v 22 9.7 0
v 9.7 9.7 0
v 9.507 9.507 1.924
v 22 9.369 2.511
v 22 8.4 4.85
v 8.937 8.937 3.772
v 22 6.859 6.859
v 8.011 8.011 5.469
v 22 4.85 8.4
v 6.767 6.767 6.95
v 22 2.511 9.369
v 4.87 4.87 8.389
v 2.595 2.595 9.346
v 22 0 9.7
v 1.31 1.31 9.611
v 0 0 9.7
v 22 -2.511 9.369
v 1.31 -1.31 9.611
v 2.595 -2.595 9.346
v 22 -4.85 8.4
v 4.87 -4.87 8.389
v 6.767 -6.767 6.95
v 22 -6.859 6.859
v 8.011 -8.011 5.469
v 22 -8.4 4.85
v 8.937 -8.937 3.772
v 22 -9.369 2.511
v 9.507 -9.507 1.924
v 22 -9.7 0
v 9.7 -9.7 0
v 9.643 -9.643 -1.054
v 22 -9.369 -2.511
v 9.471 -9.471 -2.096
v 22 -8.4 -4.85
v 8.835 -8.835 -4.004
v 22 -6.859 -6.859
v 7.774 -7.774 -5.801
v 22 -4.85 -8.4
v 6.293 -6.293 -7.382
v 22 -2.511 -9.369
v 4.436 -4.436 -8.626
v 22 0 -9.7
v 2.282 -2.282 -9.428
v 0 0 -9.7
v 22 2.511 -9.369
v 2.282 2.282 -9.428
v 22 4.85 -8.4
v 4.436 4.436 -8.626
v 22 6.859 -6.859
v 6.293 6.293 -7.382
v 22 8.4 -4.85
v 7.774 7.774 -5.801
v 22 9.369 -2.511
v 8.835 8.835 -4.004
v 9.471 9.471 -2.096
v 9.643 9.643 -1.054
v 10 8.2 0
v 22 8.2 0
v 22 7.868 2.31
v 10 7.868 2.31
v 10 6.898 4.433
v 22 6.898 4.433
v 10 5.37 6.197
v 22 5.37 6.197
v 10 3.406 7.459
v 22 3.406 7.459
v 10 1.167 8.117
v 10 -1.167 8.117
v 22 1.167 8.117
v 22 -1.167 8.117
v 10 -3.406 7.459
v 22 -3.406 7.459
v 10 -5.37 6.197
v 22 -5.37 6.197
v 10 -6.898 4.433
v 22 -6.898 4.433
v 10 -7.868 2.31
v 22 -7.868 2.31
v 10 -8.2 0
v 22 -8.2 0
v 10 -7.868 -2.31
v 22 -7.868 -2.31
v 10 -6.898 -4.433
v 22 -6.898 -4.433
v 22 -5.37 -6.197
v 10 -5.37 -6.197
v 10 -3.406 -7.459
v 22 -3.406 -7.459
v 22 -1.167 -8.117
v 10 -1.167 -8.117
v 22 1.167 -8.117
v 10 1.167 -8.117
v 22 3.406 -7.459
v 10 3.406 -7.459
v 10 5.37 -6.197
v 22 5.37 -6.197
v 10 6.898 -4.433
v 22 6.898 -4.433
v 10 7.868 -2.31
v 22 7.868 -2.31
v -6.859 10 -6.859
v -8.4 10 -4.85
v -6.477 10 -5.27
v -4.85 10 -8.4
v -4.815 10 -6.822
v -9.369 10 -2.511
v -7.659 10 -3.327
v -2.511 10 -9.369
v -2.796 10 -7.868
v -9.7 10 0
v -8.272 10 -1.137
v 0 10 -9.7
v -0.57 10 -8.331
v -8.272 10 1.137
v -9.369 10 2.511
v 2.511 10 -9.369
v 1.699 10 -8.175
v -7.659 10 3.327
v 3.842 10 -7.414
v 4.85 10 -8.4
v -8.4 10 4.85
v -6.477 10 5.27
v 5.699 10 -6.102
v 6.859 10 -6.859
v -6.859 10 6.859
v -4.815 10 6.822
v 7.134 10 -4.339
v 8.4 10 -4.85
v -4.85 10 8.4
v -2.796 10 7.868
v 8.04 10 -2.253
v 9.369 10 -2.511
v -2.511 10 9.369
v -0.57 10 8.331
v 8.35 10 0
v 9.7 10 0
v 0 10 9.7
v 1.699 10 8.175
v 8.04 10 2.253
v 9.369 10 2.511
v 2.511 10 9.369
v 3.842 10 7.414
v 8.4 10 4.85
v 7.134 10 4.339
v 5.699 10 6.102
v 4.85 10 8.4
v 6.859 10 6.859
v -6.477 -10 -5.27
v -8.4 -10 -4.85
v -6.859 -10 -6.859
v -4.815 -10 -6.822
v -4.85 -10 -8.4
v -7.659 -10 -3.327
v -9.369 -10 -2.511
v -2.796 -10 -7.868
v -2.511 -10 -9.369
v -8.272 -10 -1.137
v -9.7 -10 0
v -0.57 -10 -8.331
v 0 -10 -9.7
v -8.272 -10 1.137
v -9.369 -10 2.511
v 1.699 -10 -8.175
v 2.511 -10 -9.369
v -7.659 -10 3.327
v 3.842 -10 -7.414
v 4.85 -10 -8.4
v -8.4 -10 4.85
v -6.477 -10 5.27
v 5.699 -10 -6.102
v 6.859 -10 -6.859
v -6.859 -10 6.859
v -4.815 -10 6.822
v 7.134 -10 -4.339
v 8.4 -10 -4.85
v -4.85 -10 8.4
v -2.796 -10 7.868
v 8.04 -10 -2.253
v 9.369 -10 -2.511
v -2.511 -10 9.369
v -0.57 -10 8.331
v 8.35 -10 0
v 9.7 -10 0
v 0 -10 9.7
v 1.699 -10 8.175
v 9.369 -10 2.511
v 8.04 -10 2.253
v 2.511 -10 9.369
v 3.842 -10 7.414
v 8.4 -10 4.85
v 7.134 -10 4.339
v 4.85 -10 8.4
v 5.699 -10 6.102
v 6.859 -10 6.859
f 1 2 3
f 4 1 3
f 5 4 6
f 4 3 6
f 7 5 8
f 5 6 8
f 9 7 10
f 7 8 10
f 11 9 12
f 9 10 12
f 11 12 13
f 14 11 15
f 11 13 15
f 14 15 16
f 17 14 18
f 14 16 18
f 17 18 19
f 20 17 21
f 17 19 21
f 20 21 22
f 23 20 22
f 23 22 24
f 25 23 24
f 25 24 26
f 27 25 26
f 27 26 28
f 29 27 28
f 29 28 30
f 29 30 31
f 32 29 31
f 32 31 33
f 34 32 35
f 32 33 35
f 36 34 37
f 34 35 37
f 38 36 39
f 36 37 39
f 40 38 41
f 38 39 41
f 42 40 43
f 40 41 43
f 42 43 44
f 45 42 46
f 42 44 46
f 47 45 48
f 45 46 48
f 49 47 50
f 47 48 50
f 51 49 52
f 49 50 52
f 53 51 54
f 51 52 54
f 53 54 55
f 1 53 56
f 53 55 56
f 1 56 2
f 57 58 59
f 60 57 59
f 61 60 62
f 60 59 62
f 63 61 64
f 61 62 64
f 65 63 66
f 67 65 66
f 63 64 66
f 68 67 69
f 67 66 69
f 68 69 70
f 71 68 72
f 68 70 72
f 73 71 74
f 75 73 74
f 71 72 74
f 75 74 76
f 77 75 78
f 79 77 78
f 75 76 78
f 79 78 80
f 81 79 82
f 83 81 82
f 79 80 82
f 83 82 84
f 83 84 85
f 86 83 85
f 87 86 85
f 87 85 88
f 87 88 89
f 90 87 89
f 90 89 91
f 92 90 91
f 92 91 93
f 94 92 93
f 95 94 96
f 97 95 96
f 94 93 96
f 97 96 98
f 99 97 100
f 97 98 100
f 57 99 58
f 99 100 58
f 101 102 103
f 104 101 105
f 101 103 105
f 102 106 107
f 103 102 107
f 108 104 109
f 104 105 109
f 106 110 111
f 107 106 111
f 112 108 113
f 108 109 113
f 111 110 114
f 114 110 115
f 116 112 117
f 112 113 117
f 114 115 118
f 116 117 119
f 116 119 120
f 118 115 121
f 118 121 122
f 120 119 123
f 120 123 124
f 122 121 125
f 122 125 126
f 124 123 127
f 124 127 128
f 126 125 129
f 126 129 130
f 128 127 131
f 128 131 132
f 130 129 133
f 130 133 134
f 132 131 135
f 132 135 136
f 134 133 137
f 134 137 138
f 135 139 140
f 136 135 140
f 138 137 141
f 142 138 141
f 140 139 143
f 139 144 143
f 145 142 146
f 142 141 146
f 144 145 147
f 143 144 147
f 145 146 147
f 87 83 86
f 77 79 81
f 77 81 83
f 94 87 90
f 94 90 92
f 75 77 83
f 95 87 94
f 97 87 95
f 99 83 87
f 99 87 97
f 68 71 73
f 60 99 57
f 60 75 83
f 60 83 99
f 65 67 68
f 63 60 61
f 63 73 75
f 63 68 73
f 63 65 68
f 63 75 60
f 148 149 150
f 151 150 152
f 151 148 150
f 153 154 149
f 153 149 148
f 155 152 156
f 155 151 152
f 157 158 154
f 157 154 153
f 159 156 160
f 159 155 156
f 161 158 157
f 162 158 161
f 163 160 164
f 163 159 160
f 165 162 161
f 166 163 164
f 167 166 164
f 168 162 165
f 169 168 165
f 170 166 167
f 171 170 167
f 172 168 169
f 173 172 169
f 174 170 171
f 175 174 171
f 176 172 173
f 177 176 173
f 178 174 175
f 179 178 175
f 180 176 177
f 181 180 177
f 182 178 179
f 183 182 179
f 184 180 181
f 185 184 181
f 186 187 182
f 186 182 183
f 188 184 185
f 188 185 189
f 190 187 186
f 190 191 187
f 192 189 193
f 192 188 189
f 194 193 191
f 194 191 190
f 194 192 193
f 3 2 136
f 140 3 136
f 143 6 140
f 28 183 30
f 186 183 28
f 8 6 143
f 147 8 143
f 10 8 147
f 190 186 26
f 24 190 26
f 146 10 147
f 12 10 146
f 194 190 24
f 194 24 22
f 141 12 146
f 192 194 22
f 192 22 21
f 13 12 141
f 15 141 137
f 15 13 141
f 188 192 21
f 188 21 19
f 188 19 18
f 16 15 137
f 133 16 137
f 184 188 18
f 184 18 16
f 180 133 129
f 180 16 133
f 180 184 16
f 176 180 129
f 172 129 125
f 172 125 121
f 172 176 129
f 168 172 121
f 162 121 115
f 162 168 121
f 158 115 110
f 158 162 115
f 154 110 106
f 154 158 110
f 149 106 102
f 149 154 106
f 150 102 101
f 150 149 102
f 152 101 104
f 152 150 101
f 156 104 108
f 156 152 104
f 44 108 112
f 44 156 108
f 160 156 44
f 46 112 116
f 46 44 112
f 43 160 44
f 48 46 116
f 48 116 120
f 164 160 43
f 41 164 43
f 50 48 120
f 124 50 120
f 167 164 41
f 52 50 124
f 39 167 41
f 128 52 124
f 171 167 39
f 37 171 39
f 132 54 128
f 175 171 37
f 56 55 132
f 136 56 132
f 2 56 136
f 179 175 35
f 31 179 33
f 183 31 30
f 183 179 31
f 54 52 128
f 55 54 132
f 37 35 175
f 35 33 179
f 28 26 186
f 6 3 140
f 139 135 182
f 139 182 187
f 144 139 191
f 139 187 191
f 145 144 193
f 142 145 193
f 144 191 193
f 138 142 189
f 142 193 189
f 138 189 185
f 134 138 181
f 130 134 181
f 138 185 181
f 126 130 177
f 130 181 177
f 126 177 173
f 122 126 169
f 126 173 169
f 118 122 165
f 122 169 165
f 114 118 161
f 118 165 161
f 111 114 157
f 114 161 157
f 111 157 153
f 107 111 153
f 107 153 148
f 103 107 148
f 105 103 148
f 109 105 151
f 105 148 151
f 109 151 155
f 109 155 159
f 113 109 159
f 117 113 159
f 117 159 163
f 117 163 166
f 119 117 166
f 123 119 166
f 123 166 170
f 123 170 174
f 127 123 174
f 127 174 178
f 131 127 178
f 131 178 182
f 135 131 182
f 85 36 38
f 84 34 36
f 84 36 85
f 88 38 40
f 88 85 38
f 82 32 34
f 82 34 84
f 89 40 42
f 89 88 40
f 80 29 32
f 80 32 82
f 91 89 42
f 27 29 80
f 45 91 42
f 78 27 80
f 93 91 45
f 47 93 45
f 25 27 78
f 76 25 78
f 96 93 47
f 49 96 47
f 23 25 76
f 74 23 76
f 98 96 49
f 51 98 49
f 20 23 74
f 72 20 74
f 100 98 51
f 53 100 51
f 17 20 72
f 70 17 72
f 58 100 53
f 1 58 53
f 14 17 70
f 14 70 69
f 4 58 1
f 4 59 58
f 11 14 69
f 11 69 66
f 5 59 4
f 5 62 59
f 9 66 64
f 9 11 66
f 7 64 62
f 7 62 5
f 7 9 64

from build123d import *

# Parameters (mm, degrees)
SKETCH022_R     = 9.7
PAD007_DEPTH    = 10
SKETCH023_R     = 9.7
PAD008_DEPTH    = 22
SKETCH024_R     = 8.35
POCKET013_DEPTH = 23
SKETCH025_R     = 8.2
POCKET014_DEPTH = 12


with BuildPart() as part:
    # Sketch022 → Pad007 (new body, symmetric)
    with BuildSketch(Plane.XZ):
        Circle(SKETCH022_R)
    extrude(amount=PAD007_DEPTH, both=True)

    # Sketch023 → Pad008 (join)
    with BuildSketch(Plane.YZ):
        Circle(SKETCH023_R)
    extrude(amount=PAD008_DEPTH)

    # Sketch024 → Pocket013 (cut)
    with BuildSketch(Plane.XZ.offset(10)):
        Circle(SKETCH024_R)
    extrude(amount=-POCKET013_DEPTH, mode=Mode.SUBTRACT)

    # Sketch025 → Pocket014 (cut)
    with BuildSketch(Plane.YZ.offset(22)):
        Circle(SKETCH025_R)
    extrude(amount=-POCKET014_DEPTH, mode=Mode.SUBTRACT)


solid = part.part
